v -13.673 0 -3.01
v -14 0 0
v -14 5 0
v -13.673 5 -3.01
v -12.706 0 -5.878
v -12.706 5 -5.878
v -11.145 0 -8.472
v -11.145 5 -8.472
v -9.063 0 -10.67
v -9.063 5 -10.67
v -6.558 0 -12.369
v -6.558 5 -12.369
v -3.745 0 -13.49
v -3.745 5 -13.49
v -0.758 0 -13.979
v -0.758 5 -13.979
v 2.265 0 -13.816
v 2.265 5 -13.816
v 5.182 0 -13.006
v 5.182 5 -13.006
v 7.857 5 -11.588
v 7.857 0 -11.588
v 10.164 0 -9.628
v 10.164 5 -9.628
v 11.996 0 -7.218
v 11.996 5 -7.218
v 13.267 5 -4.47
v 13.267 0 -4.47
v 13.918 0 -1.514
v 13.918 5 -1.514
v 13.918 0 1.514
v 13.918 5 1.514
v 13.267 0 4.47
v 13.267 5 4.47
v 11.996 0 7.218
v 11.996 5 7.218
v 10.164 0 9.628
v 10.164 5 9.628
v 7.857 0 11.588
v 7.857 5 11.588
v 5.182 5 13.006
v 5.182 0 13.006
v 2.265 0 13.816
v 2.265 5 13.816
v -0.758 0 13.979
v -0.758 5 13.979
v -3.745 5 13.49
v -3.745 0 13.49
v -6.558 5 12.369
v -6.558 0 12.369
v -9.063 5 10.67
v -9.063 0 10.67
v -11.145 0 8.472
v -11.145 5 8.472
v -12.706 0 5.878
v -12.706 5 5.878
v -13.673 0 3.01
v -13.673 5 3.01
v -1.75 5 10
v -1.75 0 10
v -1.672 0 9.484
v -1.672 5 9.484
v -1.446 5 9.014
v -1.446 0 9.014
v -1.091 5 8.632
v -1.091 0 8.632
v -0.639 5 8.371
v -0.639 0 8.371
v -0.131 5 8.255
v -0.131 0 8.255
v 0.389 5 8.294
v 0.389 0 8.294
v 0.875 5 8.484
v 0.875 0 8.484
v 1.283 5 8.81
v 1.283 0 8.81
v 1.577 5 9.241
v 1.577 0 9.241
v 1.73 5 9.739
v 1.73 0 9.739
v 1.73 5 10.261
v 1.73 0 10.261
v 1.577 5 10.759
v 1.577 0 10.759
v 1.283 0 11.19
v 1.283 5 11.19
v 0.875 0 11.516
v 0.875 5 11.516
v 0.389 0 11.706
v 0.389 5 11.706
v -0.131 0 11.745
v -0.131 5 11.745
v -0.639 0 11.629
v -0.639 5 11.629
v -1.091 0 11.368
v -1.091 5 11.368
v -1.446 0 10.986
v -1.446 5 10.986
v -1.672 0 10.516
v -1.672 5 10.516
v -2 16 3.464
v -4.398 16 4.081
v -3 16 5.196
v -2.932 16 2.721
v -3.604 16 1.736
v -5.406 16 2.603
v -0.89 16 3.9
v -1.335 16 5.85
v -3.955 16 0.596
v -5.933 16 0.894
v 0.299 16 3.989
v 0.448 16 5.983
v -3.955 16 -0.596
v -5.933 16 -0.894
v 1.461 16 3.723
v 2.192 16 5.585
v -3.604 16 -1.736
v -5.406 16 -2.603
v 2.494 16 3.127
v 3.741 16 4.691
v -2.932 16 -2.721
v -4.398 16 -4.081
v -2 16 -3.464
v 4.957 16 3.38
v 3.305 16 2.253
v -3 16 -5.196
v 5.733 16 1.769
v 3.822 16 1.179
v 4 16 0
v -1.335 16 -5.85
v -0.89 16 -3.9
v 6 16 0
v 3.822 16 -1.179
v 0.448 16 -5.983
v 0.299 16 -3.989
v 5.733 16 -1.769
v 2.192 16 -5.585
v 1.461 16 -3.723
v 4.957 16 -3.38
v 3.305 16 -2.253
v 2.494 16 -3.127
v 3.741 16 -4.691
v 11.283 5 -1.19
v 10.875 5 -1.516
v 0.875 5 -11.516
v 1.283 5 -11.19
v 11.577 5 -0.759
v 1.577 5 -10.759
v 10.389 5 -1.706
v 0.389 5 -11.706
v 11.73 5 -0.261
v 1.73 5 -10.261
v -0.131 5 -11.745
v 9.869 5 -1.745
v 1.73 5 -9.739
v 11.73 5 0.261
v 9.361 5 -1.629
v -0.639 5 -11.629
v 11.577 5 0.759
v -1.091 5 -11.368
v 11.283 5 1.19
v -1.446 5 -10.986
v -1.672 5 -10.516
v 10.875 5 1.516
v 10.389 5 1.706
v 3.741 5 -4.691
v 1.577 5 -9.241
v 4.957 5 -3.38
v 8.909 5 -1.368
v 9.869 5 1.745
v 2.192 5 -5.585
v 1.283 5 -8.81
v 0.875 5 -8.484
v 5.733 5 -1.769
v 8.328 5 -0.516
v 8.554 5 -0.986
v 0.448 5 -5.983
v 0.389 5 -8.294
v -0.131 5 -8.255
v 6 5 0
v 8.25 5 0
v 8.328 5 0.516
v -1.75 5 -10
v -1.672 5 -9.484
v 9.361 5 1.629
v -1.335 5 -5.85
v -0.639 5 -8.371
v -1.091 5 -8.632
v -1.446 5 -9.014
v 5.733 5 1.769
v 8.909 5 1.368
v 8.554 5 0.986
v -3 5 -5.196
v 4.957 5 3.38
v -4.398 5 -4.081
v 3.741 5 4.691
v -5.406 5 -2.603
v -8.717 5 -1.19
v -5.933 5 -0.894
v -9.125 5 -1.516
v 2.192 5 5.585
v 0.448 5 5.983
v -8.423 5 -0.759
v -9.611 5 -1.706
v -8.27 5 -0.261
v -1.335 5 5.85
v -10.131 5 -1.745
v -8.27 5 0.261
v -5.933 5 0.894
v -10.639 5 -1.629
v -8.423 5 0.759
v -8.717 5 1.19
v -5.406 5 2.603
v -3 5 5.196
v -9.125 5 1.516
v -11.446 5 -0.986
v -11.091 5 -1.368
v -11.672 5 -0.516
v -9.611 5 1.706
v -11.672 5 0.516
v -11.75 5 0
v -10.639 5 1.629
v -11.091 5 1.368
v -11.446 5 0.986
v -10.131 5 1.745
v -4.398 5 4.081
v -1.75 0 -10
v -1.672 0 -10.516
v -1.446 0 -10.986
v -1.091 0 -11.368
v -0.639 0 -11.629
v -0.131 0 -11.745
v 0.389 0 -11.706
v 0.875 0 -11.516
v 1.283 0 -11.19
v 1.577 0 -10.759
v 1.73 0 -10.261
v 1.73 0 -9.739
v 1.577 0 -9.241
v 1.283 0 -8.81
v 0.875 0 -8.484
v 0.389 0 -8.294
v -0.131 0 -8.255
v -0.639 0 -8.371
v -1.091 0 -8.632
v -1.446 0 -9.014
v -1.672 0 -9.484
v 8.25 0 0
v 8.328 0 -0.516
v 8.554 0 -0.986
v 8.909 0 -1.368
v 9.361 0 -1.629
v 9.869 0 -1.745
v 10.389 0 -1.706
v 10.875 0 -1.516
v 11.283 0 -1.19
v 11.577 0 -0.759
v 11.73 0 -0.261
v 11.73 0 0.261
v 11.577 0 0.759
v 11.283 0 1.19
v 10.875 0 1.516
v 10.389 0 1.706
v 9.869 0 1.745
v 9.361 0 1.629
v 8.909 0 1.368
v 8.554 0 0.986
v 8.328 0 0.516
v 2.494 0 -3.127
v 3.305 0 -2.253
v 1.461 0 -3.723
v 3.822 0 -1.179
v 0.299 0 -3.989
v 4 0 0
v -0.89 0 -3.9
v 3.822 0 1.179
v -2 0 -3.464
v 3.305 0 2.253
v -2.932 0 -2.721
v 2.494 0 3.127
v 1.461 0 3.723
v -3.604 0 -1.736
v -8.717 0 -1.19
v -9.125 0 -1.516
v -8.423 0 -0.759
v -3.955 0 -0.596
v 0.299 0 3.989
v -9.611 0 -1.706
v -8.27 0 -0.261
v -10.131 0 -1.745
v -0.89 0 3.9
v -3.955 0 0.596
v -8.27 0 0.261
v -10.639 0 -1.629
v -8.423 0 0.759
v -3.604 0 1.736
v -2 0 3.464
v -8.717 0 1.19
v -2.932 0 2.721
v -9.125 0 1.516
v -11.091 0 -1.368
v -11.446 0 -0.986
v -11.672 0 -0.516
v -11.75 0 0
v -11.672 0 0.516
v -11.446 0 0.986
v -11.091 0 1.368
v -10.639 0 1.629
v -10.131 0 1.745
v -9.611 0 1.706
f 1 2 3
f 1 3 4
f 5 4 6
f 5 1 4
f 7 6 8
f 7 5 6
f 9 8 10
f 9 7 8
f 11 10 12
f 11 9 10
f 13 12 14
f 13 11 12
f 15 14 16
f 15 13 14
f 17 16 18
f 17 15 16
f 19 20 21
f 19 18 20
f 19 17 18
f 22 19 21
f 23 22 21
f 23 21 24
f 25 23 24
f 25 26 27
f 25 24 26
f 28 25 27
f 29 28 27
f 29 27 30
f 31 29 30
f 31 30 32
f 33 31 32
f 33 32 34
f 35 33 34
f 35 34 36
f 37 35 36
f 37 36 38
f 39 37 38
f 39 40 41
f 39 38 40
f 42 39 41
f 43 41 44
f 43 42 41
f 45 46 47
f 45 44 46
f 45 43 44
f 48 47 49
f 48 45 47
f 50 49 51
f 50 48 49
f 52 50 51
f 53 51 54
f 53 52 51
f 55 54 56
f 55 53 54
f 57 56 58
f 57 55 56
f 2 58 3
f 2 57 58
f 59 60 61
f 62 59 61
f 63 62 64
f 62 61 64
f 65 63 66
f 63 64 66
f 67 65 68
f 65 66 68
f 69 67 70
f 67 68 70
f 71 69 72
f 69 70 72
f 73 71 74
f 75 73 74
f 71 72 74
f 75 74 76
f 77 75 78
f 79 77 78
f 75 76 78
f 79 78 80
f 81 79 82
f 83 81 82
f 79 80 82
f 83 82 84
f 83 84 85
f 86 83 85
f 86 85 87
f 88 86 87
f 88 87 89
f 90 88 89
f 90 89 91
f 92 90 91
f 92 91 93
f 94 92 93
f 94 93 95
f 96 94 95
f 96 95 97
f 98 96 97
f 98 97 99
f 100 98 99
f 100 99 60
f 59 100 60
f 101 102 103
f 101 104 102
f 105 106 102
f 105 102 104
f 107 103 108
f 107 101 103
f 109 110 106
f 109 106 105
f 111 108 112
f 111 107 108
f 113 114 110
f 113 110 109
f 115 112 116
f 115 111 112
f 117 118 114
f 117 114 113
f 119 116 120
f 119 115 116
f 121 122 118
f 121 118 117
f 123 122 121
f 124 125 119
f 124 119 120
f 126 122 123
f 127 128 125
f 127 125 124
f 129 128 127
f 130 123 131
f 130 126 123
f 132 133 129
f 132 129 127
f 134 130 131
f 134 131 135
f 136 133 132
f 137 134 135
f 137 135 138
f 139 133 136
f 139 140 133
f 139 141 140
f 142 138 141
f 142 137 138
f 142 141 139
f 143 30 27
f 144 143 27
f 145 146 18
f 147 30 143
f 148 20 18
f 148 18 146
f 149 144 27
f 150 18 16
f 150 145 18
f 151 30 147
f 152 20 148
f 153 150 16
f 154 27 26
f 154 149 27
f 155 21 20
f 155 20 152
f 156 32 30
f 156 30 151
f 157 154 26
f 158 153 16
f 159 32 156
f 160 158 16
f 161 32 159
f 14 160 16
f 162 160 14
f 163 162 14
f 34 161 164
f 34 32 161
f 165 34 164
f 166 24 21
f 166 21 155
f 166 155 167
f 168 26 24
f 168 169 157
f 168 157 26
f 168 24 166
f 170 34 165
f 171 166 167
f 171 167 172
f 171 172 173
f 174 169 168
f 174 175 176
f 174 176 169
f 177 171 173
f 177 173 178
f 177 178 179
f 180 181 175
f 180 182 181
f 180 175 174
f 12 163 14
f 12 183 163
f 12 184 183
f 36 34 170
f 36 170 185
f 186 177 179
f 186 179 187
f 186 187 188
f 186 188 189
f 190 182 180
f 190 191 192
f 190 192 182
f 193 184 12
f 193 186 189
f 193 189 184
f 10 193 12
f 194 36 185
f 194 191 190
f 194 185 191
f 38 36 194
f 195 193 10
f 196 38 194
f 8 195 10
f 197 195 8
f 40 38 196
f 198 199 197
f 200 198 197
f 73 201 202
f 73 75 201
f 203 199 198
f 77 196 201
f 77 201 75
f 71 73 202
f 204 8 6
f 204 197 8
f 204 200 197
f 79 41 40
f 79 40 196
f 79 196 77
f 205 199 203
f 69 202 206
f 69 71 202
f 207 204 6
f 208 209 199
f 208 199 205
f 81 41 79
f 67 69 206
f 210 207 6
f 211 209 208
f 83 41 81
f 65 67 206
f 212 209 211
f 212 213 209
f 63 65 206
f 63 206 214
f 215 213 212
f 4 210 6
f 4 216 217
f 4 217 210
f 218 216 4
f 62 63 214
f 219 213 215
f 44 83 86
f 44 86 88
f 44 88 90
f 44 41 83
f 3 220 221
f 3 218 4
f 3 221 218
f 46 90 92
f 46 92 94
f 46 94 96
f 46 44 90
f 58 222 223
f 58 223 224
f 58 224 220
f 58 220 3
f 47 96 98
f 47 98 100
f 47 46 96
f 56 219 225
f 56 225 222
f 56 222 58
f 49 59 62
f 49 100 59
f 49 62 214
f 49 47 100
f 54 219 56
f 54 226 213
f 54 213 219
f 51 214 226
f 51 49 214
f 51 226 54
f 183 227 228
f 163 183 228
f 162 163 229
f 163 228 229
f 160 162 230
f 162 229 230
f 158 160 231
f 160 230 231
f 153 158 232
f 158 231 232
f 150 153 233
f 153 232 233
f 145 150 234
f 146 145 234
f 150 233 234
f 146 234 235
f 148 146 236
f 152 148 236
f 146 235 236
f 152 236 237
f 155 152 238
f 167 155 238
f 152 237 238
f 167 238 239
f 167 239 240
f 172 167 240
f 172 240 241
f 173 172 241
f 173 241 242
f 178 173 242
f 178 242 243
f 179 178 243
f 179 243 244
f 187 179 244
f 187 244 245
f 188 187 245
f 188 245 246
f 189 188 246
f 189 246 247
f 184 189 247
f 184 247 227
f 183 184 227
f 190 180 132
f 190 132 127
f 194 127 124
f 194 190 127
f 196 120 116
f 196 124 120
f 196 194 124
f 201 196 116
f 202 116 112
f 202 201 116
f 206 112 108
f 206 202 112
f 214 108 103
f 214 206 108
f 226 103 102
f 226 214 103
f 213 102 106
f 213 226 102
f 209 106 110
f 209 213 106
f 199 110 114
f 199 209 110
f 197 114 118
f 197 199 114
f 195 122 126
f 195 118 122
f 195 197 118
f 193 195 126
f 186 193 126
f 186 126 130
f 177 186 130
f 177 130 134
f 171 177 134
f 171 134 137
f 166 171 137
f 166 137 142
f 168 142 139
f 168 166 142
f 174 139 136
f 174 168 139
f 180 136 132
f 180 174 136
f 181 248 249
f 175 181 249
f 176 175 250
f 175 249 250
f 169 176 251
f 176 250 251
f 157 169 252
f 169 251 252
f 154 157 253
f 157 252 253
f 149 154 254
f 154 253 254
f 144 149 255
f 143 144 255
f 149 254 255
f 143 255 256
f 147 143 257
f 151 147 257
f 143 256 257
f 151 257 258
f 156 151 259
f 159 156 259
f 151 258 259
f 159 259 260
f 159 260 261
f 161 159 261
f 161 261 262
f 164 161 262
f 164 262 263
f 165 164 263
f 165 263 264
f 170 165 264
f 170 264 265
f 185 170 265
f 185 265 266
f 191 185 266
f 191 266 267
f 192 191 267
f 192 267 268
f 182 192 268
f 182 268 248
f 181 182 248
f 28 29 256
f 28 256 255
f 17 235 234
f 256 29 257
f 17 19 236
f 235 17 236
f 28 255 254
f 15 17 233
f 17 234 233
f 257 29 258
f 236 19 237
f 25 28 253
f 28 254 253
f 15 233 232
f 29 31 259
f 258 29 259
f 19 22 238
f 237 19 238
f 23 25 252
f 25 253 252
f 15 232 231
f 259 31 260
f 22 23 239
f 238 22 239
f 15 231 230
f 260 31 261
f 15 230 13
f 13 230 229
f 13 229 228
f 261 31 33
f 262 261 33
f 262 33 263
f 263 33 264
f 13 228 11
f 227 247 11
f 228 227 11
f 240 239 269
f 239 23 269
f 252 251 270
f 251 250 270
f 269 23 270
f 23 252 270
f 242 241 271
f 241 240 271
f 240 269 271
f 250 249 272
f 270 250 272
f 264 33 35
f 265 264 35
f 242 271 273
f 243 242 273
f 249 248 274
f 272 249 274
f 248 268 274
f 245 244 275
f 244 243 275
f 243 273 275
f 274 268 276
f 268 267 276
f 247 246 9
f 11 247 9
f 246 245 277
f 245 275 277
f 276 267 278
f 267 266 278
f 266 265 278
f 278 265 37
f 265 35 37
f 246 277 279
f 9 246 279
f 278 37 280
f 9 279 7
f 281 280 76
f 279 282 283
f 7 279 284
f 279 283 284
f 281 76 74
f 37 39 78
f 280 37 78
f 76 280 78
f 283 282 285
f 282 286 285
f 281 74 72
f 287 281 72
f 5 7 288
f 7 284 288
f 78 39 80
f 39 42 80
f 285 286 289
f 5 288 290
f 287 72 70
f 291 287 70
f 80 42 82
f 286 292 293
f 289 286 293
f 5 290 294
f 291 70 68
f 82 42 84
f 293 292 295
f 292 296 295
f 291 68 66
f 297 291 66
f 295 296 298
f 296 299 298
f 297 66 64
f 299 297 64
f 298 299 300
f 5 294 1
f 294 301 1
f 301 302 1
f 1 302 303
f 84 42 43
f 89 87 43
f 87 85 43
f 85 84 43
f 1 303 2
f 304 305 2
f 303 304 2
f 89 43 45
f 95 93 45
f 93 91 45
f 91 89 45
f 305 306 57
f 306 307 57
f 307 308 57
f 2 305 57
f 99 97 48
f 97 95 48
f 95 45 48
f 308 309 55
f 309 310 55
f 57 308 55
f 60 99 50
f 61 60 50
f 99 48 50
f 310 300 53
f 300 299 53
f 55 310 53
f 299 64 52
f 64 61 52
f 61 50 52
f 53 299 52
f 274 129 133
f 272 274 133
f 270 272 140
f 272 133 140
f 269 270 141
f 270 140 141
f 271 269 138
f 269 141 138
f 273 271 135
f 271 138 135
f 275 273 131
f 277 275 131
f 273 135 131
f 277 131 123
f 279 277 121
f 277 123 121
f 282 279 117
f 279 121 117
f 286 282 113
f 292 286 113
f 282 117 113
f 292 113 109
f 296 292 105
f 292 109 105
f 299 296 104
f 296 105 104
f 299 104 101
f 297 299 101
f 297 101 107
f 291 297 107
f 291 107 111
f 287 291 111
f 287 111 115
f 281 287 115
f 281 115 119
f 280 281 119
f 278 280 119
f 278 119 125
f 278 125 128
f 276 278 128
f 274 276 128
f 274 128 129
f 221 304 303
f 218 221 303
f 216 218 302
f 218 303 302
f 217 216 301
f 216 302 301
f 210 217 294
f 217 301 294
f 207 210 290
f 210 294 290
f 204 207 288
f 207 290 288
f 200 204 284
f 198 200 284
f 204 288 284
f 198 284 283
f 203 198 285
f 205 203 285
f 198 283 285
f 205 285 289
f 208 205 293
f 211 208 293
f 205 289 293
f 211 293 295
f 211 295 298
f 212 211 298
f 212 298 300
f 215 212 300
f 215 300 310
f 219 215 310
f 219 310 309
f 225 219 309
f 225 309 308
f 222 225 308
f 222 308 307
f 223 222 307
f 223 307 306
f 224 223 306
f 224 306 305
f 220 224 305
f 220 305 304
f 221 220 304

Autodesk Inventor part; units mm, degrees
ref_plane "YZ Plane" through (0, 0, 0) normal (1, 0, 0) x (0, 1, 0)
ref_plane "XZ Plane" through (0, 0, 0) normal (0, 1, 0) x (-1, 0, 0)
ref_plane "XY Plane" through (0, 0, 0) normal (0, 0, 1) x (1, 0, 0)
sketch "草圖1" plane through (0, 0, 0) normal (0, 1, 0) x (-1, 0, 0)
  circle A0 centre (0, 0) radius 14
  circle A1 centre (0, 0) radius 10
  circle A2 centre (10, 0) radius 1.75
  circle A3 centre (0, 10) radius 1.75
  circle A4 centre (-10, 0) radius 1.75
  circle A5 centre (0, -10) radius 1.75
  dimension "d3" = 20
  dimension "d0" = 28
  dimension "d4" = 3.5
  dimension "d7" = 360
extrude "擠出1" add sketch "草圖1" along normal blind 5 contours A0 | A2 A1 A5 A4 A3
sketch "草圖2" plane through (0, 5, 0) normal (0, 1, 0) x (1, 0, 0)
  circle A0 centre (0, 0) radius 6
  dimension "d9" = 12
extrude "擠出2" add sketch "草圖2" along normal blind 11
sketch "草圖3" plane through (0, 16, 0) normal (0, 1, 0) x (1, 0, 0)
  circle A0 centre (0, 0) radius 4
  dimension "d12" = 8
extrude "擠出3" cut sketch "草圖3" against normal through all
properties part number "8mm axle mount"
